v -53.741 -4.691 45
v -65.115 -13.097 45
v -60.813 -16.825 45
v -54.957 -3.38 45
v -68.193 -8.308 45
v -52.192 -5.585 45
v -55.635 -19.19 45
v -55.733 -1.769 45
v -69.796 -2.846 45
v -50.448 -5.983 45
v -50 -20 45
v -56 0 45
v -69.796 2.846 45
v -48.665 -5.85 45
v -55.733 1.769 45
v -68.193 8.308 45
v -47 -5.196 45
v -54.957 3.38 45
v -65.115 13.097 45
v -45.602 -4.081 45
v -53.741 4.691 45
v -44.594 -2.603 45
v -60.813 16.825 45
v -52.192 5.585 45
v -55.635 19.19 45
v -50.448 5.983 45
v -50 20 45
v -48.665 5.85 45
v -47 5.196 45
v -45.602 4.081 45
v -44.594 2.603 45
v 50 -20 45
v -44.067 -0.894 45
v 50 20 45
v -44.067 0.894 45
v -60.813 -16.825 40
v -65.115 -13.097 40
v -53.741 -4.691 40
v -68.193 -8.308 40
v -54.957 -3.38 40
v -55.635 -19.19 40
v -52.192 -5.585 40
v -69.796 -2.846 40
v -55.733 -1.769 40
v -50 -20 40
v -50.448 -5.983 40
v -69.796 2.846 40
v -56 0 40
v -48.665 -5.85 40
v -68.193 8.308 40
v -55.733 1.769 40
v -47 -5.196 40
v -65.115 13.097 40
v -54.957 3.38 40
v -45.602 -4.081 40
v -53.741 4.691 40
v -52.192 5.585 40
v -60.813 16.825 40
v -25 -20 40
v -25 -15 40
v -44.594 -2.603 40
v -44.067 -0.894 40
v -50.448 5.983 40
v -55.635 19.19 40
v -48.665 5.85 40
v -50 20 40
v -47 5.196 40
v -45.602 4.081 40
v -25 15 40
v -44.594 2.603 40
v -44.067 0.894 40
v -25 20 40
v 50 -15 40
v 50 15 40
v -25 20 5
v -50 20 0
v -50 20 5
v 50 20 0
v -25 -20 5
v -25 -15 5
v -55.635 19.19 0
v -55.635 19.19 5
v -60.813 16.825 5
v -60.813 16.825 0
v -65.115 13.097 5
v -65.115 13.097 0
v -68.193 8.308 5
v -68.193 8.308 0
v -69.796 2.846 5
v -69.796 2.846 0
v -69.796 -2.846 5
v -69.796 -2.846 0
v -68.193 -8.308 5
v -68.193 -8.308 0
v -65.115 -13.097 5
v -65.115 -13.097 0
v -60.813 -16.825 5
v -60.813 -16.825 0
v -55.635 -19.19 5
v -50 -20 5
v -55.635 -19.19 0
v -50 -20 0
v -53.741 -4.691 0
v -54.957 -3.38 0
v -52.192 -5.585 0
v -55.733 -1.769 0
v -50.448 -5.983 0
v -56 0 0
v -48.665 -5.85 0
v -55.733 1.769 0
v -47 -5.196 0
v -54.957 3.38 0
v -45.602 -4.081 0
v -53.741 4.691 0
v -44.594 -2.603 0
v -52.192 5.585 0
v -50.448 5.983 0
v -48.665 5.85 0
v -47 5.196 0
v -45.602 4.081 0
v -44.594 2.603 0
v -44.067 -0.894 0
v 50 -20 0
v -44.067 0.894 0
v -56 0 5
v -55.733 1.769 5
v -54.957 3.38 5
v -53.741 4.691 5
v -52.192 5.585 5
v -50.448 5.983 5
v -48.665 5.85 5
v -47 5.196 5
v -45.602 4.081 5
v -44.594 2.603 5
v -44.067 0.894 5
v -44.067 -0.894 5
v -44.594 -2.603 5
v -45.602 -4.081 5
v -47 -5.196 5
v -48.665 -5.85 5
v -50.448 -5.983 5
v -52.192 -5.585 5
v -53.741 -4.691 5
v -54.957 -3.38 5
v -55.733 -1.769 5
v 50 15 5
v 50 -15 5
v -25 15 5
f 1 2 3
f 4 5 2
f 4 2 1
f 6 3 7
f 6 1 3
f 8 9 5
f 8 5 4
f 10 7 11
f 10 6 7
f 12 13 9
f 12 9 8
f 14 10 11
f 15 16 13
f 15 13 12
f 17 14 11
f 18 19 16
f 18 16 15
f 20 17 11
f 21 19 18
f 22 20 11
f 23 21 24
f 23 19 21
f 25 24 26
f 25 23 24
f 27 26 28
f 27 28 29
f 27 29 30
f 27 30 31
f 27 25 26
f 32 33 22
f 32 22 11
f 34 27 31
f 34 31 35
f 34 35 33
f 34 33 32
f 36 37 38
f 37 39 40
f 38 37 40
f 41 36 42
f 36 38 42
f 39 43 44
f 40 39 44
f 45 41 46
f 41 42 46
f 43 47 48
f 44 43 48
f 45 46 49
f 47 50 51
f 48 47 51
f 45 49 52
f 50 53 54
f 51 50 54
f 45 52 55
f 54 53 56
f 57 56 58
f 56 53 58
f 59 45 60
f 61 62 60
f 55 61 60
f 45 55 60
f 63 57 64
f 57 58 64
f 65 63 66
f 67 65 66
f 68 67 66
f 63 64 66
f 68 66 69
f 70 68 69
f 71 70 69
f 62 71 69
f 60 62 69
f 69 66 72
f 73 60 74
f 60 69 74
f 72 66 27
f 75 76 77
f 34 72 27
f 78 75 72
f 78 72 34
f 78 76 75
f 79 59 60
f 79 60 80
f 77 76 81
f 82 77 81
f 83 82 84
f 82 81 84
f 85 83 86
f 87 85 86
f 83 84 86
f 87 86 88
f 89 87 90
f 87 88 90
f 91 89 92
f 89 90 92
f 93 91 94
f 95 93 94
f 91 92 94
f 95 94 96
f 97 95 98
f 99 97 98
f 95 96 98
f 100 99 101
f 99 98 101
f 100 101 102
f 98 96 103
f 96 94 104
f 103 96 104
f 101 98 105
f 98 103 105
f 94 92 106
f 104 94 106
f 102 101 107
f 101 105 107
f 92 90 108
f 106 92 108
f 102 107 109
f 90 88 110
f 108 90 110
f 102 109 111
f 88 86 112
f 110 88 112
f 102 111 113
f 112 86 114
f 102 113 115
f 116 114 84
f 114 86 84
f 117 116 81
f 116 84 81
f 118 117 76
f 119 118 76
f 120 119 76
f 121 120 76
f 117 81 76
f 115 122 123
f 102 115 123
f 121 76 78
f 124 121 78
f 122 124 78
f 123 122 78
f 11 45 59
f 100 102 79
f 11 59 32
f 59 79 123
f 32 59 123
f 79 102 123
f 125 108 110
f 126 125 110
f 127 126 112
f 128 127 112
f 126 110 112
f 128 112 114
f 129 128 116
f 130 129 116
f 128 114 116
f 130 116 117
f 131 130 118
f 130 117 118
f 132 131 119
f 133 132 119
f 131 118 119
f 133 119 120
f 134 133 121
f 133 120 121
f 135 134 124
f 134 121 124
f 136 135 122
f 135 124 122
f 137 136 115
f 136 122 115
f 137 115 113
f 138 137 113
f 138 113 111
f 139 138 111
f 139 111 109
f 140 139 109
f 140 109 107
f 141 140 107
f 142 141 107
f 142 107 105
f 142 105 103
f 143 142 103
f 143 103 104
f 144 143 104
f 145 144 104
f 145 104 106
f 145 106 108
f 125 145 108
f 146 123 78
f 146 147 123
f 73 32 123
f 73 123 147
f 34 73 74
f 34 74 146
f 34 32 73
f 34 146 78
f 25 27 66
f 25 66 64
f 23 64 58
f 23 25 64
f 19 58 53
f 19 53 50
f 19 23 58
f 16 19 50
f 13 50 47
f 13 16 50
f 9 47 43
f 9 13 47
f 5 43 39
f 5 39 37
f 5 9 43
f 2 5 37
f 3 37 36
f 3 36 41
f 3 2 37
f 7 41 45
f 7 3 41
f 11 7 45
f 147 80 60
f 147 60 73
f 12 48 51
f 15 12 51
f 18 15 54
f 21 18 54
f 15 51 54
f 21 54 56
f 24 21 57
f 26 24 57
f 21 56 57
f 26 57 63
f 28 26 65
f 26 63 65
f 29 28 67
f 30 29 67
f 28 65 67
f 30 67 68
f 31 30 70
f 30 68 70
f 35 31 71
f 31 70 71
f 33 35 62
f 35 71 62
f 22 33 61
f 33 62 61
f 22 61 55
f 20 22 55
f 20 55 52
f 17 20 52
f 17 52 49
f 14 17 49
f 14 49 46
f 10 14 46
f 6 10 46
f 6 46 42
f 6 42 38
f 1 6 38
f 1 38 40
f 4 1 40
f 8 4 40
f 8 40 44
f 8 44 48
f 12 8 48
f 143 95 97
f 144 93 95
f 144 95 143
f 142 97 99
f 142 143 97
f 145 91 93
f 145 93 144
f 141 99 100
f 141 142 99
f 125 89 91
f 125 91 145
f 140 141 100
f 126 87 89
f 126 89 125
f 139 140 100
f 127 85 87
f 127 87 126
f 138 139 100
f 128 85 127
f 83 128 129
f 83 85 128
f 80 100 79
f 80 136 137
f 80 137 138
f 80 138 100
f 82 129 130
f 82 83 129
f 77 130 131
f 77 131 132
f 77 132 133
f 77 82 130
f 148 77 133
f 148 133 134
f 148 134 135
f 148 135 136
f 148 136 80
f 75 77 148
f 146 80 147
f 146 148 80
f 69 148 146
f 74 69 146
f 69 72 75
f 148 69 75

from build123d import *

# Parameters (mm, degrees)
DODANIE_WYCI_GNI_CIE1_DEPTH = 5
SZKIC2_W                    = 75
SZKIC2_H                    = 35
DODANIE_WYCI_GNI_CIE2_DEPTH = 5
SZKIC3_R                    = 6
WYTNIJ_WYCI_GNI_CIE1_DEPTH  = 86.586213843


with BuildPart() as part:
    # Szkic1 → Dodanie-wyciągnięcie1 (new body)
    with BuildSketch(Plane.XY):
        with BuildLine():
            Line((-50, -20), (50, -20))
            Line((50, -20), (50, 20))
            Line((50, 20), (-50, 20))
            ThreePointArc((-50, 20), (-70, 0), (-50, -20))
        make_face()
    extrude(amount=DODANIE_WYCI_GNI_CIE1_DEPTH)


with BuildPart() as body_2:
    # Lustro2: mirrored copy
    add(part.part.mirror(Plane.XY.offset(22.5)))


with BuildPart() as part_1:
    add(part.part)

    add(body_2.part)  # Dodanie-wyciągnięcie2 merges body 2
    # Szkic2 → Dodanie-wyciągnięcie2 (add)
    with BuildSketch(Plane(origin=(0, 20, 0), x_dir=(1, 0, 0), z_dir=(0, 1, 0))):
        with Locations((12.5, -22.5)):
            Rectangle(SZKIC2_W, SZKIC2_H)
    dodanie_wyci_gni_cie2 = extrude(amount=-DODANIE_WYCI_GNI_CIE2_DEPTH)

    # Lustro5: Dodanie-wyciągnięcie2 across plane
    add(dodanie_wyci_gni_cie2.mirror(Plane.ZX))

    # Szkic3 → Wytnij-wyciągnięcie1 (cut, through all)
    with BuildSketch(Plane(origin=(0, 0, 0), x_dir=(-1, 0, 0), z_dir=(0, 0, -1))):
        with Locations((50, 0)):
            Circle(SZKIC3_R)
    extrude(amount=-WYTNIJ_WYCI_GNI_CIE1_DEPTH, mode=Mode.SUBTRACT)


solid = part_1.part
